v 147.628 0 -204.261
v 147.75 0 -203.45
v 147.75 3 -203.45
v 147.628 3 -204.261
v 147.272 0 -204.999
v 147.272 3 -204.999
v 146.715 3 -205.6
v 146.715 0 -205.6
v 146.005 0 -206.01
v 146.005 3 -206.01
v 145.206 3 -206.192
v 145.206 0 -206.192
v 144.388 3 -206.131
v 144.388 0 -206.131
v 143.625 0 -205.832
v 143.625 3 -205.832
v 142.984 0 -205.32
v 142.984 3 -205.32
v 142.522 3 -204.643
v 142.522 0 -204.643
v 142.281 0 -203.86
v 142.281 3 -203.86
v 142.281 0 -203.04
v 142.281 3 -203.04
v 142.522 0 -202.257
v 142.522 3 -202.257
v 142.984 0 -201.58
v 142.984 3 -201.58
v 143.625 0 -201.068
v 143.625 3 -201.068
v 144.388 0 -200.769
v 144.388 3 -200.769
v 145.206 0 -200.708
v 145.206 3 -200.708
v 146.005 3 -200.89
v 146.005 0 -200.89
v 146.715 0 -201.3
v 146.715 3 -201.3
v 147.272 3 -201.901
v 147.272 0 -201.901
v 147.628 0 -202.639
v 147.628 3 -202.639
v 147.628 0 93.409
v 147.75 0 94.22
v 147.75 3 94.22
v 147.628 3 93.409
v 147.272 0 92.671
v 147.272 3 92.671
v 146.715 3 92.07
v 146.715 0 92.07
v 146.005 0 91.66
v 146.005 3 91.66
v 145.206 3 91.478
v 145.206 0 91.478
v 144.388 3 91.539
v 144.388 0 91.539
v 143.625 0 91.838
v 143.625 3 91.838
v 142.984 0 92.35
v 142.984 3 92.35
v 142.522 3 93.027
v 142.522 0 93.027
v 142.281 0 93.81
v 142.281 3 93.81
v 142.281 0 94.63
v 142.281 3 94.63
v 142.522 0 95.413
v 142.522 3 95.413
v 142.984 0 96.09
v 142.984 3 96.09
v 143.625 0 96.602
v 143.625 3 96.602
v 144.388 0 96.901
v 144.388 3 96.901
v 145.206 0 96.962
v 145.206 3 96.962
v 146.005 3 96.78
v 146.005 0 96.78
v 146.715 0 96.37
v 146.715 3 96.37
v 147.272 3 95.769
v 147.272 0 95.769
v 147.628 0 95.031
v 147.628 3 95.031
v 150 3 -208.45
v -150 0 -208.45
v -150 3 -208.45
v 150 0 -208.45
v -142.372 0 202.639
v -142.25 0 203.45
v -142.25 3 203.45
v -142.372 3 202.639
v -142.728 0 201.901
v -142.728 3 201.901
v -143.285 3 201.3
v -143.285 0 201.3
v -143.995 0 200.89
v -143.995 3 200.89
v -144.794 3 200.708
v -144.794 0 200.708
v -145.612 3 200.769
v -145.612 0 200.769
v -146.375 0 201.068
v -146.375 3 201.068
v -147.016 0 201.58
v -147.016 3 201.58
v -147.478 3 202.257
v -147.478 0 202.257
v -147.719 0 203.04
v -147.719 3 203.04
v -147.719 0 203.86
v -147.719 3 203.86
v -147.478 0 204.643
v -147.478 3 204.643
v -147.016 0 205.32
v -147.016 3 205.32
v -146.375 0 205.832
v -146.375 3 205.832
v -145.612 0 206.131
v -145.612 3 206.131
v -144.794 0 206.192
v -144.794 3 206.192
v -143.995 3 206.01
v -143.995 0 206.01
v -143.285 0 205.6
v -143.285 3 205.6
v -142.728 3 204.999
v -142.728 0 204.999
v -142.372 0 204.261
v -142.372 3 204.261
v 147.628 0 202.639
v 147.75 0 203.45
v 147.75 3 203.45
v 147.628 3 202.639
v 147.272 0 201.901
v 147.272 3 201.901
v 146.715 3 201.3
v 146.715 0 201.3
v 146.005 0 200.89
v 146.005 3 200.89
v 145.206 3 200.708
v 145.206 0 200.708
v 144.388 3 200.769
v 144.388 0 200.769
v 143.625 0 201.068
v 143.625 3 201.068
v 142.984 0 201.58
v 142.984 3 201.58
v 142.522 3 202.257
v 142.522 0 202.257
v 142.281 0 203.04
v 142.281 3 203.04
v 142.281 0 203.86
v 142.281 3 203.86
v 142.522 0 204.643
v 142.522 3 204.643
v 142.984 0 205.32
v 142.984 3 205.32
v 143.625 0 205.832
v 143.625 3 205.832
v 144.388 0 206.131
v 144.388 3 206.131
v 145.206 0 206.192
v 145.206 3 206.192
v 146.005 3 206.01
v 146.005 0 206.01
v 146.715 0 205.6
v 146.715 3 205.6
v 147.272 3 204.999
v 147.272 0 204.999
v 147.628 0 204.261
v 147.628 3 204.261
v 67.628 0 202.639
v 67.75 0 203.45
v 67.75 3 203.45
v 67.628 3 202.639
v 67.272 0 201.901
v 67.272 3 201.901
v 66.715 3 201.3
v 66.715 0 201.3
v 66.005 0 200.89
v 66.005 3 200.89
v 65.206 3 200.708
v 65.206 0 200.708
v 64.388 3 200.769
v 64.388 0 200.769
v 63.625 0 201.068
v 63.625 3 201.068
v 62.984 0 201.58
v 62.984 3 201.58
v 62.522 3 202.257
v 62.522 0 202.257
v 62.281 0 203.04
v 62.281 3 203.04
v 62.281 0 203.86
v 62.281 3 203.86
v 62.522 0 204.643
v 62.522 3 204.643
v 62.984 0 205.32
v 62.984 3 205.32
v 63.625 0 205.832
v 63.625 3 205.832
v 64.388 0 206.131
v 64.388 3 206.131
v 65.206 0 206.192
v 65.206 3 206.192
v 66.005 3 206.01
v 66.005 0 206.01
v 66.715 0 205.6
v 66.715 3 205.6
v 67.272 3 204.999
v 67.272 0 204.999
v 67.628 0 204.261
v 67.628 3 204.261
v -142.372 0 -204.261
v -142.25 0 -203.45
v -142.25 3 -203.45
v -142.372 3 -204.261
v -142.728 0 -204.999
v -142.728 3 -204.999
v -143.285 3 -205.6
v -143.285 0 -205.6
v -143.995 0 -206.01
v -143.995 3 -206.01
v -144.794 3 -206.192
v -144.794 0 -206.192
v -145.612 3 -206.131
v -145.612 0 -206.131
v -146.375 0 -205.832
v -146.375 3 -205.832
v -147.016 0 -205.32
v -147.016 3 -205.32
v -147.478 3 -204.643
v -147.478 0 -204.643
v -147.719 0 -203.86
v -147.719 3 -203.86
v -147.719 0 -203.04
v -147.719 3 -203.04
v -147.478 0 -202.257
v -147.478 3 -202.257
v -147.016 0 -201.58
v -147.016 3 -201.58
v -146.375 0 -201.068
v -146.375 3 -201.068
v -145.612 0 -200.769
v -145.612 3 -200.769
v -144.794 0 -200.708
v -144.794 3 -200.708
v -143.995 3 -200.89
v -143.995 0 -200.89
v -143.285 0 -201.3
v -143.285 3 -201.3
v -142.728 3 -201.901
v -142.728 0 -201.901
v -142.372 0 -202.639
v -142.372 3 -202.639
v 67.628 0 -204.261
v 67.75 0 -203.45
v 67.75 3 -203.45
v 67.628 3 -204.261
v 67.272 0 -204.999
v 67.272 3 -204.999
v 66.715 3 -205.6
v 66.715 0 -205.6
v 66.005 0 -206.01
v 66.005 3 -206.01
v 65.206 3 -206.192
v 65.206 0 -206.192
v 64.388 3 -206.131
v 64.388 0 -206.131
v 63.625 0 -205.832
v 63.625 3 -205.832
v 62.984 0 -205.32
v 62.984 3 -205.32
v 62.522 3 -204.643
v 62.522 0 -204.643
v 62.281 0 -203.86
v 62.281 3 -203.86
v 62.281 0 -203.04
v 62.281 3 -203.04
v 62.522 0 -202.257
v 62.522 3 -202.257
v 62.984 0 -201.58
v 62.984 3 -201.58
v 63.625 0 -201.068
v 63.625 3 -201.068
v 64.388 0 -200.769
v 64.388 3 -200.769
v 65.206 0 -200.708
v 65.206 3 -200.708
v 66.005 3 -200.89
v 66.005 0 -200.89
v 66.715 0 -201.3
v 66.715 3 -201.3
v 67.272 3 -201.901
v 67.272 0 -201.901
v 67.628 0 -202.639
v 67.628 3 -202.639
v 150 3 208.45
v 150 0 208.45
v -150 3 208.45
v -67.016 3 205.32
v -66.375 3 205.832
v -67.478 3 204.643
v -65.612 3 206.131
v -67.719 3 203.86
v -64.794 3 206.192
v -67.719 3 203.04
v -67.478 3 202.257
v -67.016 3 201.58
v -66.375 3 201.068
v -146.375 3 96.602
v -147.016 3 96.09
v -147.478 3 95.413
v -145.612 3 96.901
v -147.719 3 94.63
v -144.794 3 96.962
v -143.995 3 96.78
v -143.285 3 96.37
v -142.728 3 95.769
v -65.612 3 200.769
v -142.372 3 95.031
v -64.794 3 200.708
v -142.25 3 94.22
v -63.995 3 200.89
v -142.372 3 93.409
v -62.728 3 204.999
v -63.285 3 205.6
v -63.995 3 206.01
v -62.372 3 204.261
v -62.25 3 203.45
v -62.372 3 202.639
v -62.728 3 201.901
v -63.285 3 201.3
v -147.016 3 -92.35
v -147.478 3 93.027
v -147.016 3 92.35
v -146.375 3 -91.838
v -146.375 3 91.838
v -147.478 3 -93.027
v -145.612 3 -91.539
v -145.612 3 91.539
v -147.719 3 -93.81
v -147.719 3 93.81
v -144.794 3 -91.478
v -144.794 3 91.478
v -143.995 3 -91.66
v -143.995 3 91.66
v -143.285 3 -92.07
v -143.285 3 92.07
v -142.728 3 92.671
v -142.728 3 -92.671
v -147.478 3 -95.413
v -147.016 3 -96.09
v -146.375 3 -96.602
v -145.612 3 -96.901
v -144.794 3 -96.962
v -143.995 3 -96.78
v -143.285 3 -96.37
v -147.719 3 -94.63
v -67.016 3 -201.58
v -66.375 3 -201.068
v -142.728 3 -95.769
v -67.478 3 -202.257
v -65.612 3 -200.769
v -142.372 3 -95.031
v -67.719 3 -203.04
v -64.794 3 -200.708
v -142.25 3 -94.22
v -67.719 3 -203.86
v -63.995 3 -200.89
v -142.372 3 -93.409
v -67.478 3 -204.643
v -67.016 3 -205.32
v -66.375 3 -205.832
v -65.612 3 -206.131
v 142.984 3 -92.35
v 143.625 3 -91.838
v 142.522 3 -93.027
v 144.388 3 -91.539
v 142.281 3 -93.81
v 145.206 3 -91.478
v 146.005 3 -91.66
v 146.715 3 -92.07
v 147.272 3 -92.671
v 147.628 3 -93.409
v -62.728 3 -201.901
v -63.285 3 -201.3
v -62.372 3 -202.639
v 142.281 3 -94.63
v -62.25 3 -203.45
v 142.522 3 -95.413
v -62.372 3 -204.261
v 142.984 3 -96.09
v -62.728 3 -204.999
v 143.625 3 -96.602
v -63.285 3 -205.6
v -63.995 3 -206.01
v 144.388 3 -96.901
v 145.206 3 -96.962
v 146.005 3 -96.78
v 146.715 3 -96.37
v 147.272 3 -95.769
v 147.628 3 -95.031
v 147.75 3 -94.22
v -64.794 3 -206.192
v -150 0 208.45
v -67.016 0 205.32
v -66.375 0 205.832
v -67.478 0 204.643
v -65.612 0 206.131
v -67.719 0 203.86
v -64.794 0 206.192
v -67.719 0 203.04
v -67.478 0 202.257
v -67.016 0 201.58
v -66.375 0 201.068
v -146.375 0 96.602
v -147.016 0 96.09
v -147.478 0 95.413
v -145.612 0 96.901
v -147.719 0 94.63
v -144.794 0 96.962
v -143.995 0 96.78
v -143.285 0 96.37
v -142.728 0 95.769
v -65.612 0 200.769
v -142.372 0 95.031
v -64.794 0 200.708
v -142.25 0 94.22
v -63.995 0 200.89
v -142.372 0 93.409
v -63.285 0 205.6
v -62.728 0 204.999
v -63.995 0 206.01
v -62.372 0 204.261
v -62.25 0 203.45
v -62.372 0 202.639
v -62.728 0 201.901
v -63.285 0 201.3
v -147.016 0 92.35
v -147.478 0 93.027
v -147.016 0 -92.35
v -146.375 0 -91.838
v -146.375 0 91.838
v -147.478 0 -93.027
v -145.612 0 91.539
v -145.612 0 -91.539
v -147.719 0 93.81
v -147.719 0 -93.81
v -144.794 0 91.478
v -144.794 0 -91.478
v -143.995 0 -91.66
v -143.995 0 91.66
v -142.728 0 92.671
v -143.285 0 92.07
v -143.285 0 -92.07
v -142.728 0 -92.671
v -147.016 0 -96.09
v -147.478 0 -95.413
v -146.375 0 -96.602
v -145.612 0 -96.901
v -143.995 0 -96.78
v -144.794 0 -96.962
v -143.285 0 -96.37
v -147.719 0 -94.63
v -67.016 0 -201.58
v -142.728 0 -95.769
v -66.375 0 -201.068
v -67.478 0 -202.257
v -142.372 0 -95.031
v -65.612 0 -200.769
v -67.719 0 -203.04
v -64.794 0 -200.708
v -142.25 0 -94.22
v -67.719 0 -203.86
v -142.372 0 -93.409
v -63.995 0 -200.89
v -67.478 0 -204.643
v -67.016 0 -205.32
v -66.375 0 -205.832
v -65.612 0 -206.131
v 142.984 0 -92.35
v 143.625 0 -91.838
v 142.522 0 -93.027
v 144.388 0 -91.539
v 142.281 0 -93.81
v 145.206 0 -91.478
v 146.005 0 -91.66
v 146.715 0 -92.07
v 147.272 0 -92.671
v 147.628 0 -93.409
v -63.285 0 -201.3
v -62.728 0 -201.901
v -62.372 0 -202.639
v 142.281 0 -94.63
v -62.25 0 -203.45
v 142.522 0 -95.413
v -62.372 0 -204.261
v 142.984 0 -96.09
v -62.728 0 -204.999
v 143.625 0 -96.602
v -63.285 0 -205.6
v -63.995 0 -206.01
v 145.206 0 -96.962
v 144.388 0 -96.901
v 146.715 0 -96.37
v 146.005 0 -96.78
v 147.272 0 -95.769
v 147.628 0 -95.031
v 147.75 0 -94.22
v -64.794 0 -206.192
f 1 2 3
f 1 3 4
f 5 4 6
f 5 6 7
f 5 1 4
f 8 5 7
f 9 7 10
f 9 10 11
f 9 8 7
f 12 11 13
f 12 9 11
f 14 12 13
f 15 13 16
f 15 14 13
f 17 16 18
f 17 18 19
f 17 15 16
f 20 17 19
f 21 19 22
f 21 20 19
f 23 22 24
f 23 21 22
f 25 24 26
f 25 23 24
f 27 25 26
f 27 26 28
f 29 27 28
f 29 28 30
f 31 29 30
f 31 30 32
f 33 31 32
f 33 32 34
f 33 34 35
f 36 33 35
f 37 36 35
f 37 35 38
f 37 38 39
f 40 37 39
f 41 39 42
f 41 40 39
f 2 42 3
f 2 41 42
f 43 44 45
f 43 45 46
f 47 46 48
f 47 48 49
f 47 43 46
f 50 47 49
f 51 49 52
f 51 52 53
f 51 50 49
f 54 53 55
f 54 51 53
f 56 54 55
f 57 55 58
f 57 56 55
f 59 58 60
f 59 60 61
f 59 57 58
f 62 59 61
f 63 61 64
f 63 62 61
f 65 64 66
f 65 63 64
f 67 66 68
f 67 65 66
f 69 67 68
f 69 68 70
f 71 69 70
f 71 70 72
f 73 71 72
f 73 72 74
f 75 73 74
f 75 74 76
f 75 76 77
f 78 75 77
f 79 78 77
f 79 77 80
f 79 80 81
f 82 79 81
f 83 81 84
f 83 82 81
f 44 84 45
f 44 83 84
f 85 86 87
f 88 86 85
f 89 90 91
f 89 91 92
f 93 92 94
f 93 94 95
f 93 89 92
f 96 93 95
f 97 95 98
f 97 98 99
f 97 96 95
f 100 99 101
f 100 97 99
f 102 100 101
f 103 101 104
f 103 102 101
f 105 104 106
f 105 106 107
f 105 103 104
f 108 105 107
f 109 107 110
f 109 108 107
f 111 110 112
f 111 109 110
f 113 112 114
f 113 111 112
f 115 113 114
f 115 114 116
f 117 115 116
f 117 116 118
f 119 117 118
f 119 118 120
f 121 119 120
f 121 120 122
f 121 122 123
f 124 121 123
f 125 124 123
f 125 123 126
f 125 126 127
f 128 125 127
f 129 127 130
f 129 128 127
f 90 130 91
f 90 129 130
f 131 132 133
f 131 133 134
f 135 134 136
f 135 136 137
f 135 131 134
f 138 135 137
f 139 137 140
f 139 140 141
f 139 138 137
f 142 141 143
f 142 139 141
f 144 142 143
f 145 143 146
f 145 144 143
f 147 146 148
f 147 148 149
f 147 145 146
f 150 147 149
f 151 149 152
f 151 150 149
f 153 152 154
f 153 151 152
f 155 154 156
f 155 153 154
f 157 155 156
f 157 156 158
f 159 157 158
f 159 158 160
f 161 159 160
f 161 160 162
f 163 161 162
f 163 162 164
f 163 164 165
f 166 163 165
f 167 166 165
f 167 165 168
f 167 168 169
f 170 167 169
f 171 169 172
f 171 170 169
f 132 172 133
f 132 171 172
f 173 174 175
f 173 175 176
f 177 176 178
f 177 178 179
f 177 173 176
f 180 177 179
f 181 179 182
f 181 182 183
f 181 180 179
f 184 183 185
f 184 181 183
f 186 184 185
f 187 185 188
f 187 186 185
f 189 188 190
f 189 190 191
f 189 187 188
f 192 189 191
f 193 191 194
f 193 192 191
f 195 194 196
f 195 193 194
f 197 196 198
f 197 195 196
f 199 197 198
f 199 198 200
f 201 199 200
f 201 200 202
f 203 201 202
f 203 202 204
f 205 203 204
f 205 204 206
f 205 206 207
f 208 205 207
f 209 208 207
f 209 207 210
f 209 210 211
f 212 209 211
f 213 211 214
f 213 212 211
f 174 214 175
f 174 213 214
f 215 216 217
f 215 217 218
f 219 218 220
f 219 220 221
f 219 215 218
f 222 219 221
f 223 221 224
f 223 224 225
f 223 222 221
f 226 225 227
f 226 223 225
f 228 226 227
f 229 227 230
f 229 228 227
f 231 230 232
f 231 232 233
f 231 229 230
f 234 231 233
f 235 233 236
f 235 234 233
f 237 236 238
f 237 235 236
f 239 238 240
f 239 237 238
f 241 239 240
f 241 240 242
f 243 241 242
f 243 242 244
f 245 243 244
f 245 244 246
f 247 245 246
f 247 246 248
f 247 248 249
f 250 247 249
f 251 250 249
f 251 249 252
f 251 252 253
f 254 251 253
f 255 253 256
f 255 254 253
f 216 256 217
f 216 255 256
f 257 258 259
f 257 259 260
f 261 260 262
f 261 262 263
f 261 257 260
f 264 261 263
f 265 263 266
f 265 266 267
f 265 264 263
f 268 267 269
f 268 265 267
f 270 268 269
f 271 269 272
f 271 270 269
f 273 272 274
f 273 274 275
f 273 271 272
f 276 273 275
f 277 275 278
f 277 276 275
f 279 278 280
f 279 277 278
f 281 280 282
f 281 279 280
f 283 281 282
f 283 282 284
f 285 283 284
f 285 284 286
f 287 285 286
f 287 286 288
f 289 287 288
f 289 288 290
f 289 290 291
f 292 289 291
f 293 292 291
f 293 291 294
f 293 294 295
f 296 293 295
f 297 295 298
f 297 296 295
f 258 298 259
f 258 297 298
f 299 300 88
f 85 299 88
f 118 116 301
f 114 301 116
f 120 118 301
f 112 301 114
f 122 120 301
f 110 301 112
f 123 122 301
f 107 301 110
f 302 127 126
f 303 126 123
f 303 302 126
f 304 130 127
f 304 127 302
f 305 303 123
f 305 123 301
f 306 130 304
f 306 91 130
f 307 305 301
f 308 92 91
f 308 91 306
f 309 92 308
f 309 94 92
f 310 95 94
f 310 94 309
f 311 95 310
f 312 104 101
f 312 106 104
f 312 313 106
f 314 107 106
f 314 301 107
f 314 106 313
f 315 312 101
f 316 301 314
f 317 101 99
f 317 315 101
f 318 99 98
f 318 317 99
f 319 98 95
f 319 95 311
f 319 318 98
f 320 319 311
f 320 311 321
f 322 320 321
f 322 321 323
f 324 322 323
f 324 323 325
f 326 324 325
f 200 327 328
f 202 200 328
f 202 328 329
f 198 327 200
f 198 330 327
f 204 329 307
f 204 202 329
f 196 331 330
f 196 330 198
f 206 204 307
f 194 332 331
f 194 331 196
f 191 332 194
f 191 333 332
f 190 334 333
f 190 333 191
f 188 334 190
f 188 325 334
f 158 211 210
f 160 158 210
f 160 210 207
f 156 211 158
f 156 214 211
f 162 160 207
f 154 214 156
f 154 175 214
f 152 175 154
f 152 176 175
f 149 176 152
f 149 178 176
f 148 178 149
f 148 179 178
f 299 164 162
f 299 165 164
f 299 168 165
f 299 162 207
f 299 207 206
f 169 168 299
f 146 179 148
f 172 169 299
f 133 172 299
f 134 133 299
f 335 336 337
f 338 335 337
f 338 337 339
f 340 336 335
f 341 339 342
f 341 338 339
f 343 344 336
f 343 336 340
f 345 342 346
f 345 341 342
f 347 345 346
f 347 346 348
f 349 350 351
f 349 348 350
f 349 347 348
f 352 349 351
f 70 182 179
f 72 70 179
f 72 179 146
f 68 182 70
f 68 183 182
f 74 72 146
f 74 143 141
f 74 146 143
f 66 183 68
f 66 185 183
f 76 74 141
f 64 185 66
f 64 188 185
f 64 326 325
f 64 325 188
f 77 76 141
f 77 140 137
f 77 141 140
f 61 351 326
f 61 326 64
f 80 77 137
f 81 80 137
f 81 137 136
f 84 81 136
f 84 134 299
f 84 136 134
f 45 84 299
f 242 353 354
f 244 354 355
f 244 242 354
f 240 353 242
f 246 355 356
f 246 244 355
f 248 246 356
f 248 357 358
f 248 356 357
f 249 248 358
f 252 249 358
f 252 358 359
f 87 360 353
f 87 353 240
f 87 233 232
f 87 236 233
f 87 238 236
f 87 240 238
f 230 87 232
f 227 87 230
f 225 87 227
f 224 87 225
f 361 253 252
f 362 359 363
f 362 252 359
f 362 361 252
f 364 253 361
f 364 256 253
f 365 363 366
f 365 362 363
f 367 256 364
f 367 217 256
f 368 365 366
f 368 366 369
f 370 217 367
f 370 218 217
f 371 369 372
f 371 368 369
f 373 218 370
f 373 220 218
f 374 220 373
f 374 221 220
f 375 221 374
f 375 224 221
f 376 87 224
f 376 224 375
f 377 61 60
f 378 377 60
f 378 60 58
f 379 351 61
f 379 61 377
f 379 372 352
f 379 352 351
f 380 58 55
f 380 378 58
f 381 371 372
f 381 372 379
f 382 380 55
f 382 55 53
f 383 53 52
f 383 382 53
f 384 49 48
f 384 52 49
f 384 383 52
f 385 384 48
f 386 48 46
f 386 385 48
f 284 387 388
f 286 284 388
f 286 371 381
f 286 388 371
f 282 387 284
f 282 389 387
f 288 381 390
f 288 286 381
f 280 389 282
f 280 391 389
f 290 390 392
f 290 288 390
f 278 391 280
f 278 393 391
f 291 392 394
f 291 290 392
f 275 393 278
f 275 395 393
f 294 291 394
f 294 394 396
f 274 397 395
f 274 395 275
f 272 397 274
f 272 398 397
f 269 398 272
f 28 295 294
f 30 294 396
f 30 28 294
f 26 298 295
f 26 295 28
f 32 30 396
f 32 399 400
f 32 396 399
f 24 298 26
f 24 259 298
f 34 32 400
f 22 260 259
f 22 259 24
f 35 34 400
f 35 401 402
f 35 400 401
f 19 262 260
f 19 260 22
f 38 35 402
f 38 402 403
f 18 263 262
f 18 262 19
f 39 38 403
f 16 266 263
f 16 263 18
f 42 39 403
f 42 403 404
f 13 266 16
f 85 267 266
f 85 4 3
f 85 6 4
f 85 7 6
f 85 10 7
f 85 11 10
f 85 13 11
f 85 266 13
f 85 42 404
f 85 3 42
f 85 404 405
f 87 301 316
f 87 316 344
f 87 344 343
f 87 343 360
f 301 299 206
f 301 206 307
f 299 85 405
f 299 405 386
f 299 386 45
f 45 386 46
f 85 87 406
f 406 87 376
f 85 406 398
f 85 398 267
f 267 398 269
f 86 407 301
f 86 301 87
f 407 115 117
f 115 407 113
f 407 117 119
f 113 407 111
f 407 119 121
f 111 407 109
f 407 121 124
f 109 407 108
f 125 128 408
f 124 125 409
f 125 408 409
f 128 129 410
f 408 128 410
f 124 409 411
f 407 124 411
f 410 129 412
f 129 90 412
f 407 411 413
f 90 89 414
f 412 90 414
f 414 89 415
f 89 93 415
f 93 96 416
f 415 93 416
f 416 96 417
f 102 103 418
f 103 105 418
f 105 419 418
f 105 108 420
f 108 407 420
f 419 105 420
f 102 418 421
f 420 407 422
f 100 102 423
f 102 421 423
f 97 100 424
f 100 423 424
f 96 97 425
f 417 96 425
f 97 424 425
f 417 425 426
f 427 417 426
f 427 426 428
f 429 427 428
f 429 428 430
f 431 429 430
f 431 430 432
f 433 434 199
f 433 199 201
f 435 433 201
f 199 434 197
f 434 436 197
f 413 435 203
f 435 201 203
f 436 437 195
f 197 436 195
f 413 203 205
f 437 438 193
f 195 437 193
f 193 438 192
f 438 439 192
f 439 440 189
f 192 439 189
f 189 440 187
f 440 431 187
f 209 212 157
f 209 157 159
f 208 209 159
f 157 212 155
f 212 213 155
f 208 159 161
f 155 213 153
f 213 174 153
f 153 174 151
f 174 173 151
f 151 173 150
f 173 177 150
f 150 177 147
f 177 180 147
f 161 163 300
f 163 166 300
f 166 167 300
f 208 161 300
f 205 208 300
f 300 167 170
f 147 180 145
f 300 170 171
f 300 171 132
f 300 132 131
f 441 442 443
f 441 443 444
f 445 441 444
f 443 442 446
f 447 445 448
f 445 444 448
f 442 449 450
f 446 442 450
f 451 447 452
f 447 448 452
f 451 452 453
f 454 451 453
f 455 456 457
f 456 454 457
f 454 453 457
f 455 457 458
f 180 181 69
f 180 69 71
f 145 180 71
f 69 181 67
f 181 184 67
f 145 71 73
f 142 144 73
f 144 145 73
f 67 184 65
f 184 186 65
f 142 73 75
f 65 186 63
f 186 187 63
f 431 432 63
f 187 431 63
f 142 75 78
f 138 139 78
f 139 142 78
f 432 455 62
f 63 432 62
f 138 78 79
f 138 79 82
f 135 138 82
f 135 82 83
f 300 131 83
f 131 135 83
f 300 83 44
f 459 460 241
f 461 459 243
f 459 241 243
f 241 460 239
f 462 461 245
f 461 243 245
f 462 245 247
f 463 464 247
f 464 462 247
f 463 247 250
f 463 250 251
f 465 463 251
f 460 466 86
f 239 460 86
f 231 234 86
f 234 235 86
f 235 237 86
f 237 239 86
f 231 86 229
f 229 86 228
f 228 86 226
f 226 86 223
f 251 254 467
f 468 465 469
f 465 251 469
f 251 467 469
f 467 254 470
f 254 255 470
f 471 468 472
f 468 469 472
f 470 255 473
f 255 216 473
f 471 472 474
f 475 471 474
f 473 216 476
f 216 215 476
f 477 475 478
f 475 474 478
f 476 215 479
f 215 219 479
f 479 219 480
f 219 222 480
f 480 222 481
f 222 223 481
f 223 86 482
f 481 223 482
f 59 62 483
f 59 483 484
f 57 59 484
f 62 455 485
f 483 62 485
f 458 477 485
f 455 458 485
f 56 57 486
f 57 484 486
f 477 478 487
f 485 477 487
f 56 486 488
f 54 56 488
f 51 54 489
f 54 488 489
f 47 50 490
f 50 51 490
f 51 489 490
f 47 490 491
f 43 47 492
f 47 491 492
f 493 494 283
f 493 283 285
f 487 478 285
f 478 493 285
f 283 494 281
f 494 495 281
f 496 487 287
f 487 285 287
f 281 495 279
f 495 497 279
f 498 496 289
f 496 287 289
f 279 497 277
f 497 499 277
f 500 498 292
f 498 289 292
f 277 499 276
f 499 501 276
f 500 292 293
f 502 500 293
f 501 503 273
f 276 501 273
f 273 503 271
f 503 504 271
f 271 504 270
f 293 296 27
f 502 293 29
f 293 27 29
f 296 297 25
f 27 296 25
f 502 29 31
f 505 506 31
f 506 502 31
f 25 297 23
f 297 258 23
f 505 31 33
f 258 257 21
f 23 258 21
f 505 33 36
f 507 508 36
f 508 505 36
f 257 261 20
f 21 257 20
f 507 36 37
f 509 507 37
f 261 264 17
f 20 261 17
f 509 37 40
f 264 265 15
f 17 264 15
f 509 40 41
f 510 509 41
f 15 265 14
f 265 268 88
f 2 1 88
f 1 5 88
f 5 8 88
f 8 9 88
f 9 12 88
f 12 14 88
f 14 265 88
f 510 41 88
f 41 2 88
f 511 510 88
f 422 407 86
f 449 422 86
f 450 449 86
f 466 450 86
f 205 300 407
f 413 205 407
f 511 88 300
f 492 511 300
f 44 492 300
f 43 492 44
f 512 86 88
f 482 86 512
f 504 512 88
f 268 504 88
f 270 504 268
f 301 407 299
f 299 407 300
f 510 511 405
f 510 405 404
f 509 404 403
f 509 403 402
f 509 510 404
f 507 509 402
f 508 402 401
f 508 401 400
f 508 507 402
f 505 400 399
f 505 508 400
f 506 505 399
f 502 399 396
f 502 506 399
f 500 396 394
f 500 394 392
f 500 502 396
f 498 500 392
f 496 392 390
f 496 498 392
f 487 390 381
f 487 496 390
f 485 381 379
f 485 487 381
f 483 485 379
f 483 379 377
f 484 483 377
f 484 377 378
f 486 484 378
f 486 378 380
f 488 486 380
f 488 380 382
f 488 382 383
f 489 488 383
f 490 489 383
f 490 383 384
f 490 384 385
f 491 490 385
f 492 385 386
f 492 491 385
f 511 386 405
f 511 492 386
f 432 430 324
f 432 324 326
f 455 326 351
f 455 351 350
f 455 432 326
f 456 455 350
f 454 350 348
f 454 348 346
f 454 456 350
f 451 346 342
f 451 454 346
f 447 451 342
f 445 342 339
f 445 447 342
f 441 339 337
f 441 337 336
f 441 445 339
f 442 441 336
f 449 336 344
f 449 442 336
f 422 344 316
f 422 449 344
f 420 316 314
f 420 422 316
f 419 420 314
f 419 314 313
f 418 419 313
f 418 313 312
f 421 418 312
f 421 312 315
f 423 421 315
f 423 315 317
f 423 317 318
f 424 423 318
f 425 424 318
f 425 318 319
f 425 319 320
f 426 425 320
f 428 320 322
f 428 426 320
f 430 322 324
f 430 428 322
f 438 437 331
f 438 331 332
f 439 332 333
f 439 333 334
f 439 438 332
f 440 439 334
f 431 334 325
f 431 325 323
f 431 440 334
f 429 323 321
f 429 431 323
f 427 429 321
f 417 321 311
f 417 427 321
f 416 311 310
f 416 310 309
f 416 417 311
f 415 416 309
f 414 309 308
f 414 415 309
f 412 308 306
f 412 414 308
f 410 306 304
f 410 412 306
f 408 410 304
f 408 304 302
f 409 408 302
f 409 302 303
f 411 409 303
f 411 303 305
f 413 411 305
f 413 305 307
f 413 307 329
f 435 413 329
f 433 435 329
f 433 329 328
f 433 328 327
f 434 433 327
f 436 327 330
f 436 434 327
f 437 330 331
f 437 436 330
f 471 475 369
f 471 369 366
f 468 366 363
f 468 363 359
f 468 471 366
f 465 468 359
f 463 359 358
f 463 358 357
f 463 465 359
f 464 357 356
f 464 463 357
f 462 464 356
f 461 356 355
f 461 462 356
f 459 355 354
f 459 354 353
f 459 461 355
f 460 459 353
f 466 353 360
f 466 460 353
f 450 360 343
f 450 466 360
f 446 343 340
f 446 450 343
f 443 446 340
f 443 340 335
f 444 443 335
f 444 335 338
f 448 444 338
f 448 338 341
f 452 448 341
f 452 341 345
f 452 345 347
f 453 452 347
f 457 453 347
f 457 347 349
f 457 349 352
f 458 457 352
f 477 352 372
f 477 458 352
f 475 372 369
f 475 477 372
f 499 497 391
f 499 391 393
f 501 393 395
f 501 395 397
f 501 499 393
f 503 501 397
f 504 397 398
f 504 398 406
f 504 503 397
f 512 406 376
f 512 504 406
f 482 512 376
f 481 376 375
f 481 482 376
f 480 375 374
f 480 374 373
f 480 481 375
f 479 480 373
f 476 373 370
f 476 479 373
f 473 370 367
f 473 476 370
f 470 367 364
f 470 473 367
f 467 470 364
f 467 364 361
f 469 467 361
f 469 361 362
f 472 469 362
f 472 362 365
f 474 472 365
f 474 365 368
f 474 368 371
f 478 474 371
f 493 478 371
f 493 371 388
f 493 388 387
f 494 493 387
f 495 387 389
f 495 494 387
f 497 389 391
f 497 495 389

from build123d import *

# Parameters (mm, degrees)
SKETCH1_W                    = 300
SKETCH1_H                    = 416.9
BOSS_EXTRUDE1_DEPTH          = 3
M5_CLEARANCE_HOLE1_OUTLINE_R = 2.75
M5_CLEARANCE_HOLE1_DEPTH     = 3


# Read off the part's stored shape, not the designer's step: M5 Clearance Hole1
with BuildPart() as part:
    # Sketch1 → Boss-Extrude1 (new body)
    with BuildSketch(Plane(origin=(0, 0, 0), x_dir=(1, 0, 0), z_dir=(0, 1, 0))):
        Rectangle(SKETCH1_W, SKETCH1_H)
    extrude(amount=BOSS_EXTRUDE1_DEPTH)

    # M5 Clearance Hole1 outline → M5 Clearance Hole1 (cut)
    with BuildSketch(Plane(origin=(0, 0, 0), x_dir=(1, 0, 0), z_dir=(0, 1, 0))):
        with Locations((65, -203.45)):
            Circle(M5_CLEARANCE_HOLE1_OUTLINE_R)
        with Locations((-65, -203.45)):
            Circle(M5_CLEARANCE_HOLE1_OUTLINE_R)
        with Locations((145, -94.22)):
            Circle(M5_CLEARANCE_HOLE1_OUTLINE_R)
        with Locations((145, 94.22)):
            Circle(M5_CLEARANCE_HOLE1_OUTLINE_R)
        with Locations((-145, -94.22)):
            Circle(M5_CLEARANCE_HOLE1_OUTLINE_R)
        with Locations((-145, 94.22)):
            Circle(M5_CLEARANCE_HOLE1_OUTLINE_R)
        with Locations((65, 203.45)):
            Circle(M5_CLEARANCE_HOLE1_OUTLINE_R)
        with Locations((-65, 203.45)):
            Circle(M5_CLEARANCE_HOLE1_OUTLINE_R)
        with Locations((145, 203.45)):
            Circle(M5_CLEARANCE_HOLE1_OUTLINE_R)
        with Locations((-145, -203.45)):
            Circle(M5_CLEARANCE_HOLE1_OUTLINE_R)
        with Locations((145, -203.45)):
            Circle(M5_CLEARANCE_HOLE1_OUTLINE_R)
        with Locations((-145, 203.45)):
            Circle(M5_CLEARANCE_HOLE1_OUTLINE_R)
    extrude(amount=M5_CLEARANCE_HOLE1_DEPTH, mode=Mode.SUBTRACT)


solid = part.part
